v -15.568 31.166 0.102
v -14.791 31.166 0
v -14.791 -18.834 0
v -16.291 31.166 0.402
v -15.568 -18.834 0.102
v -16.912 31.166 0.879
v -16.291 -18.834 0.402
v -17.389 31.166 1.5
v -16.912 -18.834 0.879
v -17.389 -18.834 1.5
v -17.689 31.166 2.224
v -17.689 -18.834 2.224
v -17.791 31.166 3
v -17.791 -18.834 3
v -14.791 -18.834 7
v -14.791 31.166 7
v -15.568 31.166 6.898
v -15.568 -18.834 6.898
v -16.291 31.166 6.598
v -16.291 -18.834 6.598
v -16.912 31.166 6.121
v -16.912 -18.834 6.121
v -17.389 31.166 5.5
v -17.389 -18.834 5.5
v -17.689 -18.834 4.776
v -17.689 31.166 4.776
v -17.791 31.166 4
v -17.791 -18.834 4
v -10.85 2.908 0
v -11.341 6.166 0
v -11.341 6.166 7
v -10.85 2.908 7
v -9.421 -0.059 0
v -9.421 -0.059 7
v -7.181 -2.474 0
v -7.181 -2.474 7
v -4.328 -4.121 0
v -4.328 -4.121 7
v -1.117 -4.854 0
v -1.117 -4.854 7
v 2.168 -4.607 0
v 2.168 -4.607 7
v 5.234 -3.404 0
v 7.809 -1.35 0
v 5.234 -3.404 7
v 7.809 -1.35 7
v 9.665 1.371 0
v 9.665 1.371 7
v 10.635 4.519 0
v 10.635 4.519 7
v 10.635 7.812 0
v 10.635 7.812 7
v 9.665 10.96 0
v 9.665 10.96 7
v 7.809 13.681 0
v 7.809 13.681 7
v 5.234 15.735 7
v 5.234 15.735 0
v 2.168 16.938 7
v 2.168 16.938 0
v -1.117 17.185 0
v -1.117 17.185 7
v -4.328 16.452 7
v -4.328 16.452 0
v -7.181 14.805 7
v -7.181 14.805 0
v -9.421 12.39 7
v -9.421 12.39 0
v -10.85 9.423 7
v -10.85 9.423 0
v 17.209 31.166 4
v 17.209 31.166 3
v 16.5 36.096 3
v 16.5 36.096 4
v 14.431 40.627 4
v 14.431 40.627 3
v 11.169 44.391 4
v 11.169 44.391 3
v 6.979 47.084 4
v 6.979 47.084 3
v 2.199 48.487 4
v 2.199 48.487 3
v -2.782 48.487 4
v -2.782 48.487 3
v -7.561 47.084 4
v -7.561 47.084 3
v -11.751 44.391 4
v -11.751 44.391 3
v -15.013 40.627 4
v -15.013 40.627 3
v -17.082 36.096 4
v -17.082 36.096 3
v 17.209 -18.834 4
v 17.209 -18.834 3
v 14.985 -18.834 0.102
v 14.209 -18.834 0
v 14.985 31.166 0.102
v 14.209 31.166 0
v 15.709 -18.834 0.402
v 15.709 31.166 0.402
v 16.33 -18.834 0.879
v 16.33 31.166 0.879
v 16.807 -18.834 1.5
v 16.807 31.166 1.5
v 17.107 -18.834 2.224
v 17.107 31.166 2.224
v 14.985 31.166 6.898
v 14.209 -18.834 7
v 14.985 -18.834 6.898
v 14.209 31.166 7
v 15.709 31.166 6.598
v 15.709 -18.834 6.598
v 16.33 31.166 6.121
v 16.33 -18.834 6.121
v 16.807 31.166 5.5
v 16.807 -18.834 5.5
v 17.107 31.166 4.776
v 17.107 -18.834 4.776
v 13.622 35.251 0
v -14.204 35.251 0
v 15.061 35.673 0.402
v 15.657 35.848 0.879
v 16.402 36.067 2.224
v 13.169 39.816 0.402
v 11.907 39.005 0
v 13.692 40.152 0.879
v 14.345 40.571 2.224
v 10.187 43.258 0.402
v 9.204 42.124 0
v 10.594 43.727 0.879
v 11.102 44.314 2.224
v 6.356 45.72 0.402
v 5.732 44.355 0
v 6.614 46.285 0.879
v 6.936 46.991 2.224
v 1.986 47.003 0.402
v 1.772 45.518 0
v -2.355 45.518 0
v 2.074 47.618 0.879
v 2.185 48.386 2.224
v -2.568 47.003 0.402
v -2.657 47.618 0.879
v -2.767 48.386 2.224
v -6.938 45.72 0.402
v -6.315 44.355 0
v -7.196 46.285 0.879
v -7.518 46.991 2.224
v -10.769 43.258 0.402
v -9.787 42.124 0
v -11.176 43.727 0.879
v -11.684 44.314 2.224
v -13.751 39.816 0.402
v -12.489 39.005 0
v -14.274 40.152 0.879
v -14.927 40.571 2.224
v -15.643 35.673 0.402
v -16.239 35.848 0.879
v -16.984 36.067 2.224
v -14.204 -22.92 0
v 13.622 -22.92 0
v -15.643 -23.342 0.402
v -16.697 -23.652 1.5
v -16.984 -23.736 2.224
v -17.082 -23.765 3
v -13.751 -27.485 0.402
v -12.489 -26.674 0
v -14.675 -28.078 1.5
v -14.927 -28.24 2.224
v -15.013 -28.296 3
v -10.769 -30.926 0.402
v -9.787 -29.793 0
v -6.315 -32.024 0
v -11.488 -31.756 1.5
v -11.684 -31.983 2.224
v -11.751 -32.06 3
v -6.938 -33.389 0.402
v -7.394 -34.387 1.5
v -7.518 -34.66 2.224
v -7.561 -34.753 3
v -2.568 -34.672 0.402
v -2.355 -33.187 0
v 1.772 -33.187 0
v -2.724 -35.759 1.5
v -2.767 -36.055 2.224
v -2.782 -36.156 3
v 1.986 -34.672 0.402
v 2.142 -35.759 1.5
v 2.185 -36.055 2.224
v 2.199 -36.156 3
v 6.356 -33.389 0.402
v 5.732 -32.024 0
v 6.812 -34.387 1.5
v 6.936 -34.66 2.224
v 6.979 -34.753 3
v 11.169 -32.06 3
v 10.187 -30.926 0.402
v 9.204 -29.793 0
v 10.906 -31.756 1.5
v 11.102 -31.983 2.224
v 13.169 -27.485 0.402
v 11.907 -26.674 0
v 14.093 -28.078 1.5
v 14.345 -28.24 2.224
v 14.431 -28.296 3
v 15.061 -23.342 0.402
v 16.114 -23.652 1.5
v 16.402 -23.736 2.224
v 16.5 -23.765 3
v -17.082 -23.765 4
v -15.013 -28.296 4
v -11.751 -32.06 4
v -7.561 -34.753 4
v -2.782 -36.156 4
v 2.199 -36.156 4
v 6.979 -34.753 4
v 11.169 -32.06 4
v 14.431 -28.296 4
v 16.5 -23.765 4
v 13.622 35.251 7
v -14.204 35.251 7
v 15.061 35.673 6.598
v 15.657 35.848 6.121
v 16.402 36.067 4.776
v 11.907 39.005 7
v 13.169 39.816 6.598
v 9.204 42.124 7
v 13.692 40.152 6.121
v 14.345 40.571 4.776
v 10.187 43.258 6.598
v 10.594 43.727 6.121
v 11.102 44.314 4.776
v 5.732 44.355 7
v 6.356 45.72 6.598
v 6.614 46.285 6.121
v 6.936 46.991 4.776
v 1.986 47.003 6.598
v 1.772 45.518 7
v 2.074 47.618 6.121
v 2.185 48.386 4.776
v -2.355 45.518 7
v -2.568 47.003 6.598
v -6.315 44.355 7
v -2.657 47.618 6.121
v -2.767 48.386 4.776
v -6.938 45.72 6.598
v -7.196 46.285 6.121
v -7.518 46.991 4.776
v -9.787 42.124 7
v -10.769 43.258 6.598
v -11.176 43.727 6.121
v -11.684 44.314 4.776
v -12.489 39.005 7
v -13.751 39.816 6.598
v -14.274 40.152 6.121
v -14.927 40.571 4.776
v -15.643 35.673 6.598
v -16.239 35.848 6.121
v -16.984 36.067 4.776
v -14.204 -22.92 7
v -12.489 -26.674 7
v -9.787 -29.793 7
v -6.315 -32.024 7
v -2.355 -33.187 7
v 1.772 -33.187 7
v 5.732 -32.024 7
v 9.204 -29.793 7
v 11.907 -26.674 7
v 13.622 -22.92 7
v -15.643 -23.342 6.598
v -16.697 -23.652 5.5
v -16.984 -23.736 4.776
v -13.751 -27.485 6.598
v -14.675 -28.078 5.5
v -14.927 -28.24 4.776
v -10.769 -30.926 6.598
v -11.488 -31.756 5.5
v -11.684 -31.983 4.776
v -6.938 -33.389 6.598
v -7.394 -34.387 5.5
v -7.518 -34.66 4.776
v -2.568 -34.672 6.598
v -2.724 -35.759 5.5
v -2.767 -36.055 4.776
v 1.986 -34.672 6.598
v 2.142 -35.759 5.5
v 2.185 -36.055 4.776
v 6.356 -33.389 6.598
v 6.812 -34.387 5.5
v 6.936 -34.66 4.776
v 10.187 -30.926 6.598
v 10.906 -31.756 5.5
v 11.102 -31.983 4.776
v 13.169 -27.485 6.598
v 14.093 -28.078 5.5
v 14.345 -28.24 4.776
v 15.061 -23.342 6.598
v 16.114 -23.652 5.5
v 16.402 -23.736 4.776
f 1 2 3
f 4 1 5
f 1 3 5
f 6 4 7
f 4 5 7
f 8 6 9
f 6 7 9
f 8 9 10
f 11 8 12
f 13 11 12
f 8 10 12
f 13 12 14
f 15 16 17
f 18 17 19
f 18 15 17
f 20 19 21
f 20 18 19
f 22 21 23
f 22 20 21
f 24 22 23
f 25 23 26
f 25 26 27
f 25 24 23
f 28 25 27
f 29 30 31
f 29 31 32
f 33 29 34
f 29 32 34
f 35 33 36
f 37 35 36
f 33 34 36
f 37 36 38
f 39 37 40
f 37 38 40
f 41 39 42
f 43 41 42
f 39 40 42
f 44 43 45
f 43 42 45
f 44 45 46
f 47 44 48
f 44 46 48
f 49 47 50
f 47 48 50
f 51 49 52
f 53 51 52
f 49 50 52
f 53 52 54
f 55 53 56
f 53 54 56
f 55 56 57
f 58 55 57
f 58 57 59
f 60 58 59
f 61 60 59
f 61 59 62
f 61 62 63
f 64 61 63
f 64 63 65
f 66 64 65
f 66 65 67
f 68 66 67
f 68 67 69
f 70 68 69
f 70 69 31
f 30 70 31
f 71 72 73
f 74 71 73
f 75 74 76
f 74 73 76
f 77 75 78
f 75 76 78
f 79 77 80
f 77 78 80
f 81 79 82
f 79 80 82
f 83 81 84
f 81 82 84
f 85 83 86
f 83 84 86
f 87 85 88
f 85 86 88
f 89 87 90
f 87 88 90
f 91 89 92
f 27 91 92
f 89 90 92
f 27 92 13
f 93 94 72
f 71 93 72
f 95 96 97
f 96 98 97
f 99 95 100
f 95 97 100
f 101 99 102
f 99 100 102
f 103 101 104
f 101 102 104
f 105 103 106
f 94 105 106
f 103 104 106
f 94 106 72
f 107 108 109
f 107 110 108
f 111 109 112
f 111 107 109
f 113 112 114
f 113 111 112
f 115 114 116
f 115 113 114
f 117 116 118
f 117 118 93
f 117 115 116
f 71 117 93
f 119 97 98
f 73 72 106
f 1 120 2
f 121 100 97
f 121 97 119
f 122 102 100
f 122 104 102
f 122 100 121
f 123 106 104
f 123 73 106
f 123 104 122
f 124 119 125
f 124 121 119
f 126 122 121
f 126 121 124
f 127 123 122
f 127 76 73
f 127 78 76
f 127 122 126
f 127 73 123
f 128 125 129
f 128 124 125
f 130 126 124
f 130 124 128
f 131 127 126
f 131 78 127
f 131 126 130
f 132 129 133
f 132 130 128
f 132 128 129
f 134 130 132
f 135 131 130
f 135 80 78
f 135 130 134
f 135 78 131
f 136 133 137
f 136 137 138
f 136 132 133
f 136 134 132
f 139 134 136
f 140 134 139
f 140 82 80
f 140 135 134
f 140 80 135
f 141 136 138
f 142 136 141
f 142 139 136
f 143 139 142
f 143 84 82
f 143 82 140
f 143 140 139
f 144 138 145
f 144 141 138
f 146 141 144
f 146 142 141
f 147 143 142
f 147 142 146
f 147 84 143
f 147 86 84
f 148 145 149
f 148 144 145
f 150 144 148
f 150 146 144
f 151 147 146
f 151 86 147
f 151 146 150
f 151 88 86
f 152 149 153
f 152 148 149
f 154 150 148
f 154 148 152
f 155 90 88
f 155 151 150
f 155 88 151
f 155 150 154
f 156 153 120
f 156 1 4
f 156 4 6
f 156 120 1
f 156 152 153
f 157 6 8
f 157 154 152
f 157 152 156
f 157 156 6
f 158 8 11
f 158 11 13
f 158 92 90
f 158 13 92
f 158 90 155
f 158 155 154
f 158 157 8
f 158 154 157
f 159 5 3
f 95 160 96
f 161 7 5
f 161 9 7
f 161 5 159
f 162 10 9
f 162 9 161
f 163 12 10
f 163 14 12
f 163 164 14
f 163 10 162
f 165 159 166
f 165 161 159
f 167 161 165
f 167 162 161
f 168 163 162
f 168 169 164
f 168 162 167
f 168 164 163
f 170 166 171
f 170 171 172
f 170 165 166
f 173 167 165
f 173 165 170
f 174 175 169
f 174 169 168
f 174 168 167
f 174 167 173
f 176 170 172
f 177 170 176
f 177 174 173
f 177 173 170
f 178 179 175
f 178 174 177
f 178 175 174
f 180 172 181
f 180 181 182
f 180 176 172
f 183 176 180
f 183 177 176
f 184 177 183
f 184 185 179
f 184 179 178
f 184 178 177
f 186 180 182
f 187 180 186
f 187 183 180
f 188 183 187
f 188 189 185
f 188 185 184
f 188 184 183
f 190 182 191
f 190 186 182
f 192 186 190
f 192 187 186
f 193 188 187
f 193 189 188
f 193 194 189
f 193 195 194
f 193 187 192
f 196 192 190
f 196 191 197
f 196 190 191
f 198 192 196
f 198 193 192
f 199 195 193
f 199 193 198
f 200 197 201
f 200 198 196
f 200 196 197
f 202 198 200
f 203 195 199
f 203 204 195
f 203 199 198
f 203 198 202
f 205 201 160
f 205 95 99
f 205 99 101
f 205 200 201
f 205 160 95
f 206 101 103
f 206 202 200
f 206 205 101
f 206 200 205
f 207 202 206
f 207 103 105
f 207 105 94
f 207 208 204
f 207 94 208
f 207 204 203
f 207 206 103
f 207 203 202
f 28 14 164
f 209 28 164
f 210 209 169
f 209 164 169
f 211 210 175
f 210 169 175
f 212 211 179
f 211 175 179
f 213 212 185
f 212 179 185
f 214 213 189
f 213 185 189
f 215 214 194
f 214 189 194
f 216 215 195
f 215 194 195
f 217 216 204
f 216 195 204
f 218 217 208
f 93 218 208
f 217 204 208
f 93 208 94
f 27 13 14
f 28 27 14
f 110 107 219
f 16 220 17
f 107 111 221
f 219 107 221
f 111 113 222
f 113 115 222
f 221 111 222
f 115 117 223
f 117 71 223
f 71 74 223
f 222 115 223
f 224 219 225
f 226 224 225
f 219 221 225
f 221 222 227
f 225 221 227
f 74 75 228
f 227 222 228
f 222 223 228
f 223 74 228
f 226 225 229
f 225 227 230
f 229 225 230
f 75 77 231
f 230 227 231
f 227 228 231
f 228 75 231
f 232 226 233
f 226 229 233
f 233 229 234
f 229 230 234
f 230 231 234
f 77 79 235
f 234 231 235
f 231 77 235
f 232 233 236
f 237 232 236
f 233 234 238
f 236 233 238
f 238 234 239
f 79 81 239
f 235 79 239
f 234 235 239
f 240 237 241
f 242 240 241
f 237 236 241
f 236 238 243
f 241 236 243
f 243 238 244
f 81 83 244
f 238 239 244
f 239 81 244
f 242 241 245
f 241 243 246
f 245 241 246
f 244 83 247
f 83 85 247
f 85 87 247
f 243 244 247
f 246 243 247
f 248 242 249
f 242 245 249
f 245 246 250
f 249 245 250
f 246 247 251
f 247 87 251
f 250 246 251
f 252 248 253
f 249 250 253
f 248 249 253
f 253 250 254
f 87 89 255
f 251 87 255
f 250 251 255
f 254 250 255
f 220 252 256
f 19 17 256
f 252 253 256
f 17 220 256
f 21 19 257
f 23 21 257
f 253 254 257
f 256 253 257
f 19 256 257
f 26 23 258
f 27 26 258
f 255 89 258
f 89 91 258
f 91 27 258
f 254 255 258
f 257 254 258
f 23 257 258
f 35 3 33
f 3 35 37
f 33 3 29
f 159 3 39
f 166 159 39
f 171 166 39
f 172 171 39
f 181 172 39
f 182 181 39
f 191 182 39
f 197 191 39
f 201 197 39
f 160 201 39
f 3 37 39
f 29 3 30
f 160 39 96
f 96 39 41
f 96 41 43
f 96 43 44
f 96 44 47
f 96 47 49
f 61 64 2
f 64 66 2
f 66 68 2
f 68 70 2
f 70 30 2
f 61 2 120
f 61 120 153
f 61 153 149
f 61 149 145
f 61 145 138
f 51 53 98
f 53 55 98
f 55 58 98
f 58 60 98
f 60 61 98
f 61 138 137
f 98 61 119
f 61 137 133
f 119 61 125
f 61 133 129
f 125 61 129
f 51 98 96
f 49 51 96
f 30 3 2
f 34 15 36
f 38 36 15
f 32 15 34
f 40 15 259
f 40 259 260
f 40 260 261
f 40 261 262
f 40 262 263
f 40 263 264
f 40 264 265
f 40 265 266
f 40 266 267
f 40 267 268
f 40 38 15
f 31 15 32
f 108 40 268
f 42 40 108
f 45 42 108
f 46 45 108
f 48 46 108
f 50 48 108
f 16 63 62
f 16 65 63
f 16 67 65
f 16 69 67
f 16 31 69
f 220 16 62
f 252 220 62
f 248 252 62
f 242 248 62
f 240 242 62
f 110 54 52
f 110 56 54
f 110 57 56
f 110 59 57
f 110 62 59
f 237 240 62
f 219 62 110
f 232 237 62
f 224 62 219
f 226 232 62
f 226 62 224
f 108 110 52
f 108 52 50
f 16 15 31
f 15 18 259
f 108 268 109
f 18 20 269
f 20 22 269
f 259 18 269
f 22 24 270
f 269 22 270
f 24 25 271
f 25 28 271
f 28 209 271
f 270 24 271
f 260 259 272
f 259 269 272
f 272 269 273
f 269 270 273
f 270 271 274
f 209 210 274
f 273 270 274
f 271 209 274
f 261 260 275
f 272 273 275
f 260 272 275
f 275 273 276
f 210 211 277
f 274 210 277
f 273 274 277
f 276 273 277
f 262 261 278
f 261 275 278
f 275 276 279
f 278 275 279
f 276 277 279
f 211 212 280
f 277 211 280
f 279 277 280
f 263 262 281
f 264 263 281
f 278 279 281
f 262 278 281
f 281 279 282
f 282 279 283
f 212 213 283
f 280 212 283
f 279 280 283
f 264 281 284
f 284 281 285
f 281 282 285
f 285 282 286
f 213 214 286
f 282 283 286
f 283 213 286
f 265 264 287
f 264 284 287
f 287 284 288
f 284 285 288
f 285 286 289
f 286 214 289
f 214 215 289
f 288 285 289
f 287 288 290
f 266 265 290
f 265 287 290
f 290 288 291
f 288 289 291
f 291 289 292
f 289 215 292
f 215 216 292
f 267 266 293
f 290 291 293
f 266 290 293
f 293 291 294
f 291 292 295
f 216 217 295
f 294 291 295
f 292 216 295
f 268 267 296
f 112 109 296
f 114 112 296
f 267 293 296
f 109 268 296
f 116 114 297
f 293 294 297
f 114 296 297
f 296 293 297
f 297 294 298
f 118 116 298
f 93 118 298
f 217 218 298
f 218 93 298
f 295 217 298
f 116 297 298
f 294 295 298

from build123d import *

# Parameters (mm, degrees)
F1_DEPTH = 7
F2_D     = 22.1
F3_R     = 3


with BuildPart() as f1:
    # F0 (on Top) → F1 (new body)
    with BuildSketch(Plane.XY):
        Polygon((-0.2911061255, 6.1655282974), (-17.7911061255, 31.1655282974), (-17.7911061255, -18.8344717026), align=None)
        with BuildLine():
            ThreePointArc((17.2088938745, 31.1655282974), (-0.2911061255, 48.6655282974), (-17.7911061255, 31.1655282974))
            Line((-17.7911061255, 31.1655282974), (17.2088938745, 31.1655282974))
        make_face()
        Polygon((17.2088938745, 31.1655282974), (-17.7911061255, 31.1655282974), (-0.2911061255, 6.1655282974), align=None)
        Polygon((-0.2911061255, 6.1655282974), (-17.7911061255, -18.8344717026), (17.2088938745, -18.8344717026), align=None)
        with BuildLine():
            Line((17.2088938745, -18.8344717026), (-17.7911061255, -18.8344717026))
            ThreePointArc((-17.7911061255, -18.8344717026), (-0.2911061255, -36.3344717026), (17.2088938745, -18.8344717026))
        make_face()
        Polygon((17.2088938745, -18.8344717026), (17.2088938745, 31.1655282974), (-0.2911061255, 6.1655282974), align=None)
    extrude(amount=F1_DEPTH)

    # F2 (through all)
    with Locations(Plane(origin=(0, 0, 0), x_dir=(1, 0, 0), z_dir=(0, 0, -1))):
        with Locations((-0.2911061255, -6.1655282974)):
            Hole(F2_D / 2)

    # F3
    f3_edges = [f1.edges().sort_by_distance(p)[0] for p in [
        (17.208894, -18.834472, 3.5),
        (17.208894, 31.165528, 3.5),
        (17.208894, 6.165528, 0),
        (17.208894, 6.165528, 7),
        (-17.791106, -18.834472, 3.5),
        (-0.291106, -36.334472, 0),
        (-0.291106, -36.334472, 7),
        (-17.791106, 31.165528, 3.5),
        (-17.791106, 6.165528, 0),
        (-17.791106, 6.165528, 7),
    ]]
    fillet(f3_edges, radius=F3_R)


solid = f1.part
